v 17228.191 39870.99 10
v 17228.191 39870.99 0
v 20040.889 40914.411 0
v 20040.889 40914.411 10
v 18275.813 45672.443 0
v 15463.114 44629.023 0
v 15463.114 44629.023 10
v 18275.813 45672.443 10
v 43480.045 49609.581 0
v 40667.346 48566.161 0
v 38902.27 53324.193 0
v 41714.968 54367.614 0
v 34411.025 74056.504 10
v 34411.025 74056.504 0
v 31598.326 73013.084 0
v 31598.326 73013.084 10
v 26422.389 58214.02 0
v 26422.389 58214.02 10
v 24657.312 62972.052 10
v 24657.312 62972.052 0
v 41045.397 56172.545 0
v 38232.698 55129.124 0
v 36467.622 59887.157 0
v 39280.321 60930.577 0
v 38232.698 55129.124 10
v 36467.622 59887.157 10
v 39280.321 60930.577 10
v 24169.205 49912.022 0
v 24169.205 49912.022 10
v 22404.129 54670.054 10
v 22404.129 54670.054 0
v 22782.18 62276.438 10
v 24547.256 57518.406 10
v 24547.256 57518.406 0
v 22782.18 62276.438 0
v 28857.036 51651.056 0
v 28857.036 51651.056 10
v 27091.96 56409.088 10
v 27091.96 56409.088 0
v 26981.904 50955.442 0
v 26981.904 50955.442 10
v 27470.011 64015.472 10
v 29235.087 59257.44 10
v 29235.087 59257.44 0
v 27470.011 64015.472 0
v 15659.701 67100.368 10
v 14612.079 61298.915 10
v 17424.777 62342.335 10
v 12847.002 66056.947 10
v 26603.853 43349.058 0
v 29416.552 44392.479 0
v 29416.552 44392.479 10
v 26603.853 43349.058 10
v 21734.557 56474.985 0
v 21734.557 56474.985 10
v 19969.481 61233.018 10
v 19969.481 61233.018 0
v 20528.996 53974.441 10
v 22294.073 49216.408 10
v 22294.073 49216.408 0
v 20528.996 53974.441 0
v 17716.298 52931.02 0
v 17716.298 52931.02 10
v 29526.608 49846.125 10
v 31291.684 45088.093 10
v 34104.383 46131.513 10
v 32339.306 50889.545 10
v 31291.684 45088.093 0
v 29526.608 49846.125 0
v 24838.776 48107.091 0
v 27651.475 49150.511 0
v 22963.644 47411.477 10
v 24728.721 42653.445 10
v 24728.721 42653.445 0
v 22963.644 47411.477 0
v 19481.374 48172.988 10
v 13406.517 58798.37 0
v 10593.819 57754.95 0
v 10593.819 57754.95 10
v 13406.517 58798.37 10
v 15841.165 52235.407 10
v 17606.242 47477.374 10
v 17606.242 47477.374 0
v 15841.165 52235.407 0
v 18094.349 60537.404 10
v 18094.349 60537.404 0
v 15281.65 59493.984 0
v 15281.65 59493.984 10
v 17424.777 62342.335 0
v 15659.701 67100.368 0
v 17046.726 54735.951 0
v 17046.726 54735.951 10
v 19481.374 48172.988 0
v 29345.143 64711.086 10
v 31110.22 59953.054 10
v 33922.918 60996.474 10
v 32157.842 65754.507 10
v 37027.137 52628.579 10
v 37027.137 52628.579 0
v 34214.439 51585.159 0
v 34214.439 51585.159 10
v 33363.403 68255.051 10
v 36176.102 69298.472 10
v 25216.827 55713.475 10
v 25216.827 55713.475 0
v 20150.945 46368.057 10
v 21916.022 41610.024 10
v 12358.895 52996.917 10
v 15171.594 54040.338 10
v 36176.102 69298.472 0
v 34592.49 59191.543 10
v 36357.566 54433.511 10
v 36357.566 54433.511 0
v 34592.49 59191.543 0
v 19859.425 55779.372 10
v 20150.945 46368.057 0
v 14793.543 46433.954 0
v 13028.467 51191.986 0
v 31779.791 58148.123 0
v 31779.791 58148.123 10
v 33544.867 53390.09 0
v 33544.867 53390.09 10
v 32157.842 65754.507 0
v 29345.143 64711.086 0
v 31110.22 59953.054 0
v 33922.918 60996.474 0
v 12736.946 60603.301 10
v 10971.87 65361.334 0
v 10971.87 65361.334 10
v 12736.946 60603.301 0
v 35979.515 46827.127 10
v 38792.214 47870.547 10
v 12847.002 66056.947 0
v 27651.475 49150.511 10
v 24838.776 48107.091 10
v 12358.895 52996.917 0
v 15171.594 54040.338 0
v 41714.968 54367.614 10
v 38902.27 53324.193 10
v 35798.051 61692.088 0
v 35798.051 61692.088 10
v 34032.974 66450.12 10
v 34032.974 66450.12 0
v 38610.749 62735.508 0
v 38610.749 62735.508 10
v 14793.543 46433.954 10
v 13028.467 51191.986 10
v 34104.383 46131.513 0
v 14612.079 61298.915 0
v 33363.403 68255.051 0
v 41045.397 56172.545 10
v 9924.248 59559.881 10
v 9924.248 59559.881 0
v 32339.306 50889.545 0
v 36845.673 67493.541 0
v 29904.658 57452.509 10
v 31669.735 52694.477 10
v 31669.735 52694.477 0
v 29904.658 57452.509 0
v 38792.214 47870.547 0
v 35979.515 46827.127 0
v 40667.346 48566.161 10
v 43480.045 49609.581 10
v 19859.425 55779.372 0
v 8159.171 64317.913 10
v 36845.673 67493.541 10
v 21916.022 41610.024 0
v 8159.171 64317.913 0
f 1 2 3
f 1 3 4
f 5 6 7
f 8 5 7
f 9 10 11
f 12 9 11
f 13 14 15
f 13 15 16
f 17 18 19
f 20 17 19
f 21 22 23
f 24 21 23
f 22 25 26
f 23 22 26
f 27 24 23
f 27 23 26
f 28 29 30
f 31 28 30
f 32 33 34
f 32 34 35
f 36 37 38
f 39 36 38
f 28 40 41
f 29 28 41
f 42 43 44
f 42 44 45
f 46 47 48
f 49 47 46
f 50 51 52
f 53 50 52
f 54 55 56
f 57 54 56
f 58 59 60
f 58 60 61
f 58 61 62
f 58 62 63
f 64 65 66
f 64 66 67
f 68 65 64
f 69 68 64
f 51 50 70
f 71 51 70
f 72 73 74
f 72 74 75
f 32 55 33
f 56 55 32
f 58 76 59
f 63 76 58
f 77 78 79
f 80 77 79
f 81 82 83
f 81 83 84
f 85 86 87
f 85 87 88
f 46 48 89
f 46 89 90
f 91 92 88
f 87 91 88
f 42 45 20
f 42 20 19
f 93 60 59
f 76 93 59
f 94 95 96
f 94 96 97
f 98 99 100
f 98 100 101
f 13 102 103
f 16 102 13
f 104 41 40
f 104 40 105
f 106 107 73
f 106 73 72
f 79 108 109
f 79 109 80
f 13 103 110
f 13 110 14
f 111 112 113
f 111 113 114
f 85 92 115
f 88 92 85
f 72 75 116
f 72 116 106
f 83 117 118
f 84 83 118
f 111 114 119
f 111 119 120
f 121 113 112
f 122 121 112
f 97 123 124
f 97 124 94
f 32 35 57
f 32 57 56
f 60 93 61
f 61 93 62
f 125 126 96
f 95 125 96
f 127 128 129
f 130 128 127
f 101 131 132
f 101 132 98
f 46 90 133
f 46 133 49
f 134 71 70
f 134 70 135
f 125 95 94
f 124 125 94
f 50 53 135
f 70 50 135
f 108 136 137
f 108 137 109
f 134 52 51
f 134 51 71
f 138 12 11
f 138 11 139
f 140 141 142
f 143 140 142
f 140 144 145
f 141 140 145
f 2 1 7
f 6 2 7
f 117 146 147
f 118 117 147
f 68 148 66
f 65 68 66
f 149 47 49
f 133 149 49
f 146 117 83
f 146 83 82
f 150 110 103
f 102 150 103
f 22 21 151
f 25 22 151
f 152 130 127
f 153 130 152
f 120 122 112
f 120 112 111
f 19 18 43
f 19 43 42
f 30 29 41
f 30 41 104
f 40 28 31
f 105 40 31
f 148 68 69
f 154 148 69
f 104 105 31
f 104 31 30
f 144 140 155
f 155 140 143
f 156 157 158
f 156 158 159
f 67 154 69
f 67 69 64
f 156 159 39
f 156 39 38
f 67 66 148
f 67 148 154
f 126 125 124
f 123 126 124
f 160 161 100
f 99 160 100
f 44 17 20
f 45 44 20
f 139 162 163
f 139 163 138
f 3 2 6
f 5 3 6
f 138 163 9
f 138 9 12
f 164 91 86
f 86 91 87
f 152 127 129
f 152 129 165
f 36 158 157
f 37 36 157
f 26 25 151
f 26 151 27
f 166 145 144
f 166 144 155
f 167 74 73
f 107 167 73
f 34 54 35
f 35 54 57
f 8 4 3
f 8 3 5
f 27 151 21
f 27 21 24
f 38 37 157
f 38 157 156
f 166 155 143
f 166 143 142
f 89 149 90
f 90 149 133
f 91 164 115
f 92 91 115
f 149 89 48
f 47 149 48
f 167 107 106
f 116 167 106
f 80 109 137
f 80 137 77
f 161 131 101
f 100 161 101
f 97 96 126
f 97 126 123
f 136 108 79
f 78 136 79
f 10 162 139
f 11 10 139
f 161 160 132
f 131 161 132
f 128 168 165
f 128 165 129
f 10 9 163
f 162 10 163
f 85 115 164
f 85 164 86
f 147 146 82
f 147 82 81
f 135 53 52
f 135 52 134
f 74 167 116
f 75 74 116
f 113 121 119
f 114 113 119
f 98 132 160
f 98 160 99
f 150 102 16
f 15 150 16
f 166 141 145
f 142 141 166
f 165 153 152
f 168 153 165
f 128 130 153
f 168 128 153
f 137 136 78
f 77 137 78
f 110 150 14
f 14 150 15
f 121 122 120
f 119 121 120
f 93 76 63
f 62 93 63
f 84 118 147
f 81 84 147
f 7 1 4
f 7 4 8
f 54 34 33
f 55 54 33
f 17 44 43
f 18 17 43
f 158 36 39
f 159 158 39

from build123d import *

# Parameters (mm, degrees)
BOSS_EXTRUDE1_DEPTH   = 10
LPATTERN1_START       = 35019.972121918
LPATTERN1_OUTLINE_W   = 5074.876048893
LPATTERN1_OUTLINE_H   = 10
LPATTERN1_DEPTH       = 3000
LPATTERN1_START_2     = 55019.972121918
LPATTERN1_2_OUTLINE_W = 5074.876048893
LPATTERN1_2_OUTLINE_H = 10
LPATTERN1_2_DEPTH     = 3000
LPATTERN1_START_3     = 30019.972121918
LPATTERN1_3_OUTLINE_W = 5074.876048893
LPATTERN1_3_OUTLINE_H = 10
LPATTERN1_3_DEPTH     = 2999.999999999
LPATTERN1_START_4     = 40019.972121918
LPATTERN1_4_OUTLINE_W = 5074.876048893
LPATTERN1_4_OUTLINE_H = 10
LPATTERN1_4_DEPTH     = 3000
LPATTERN1_START_5     = 45019.972121918
LPATTERN1_5_OUTLINE_W = 5074.876048893
LPATTERN1_5_OUTLINE_H = 10
LPATTERN1_5_DEPTH     = 3000
LPATTERN1_START_6     = 50019.972121918
LPATTERN1_6_OUTLINE_W = 5074.876048893
LPATTERN1_6_OUTLINE_H = 10
LPATTERN1_6_DEPTH     = 3000


# Read off the part's stored shape, not the designer's step: LPattern1
with BuildPart() as part:
    # Sketch1 → Boss-Extrude1 (new body)
    with BuildSketch(Plane.XY):
        Polygon((8159.170995645, 64317.913133173), (10971.869650874, 65361.333602048), (12736.946166348, 60603.301255988), (9924.247511118, 59559.880787113), align=None)
    extrude(amount=BOSS_EXTRUDE1_DEPTH)


with BuildPart() as body_2:
    # LPattern1 outline → LPattern1 (new body)
    with BuildSketch(Plane(origin=(0, 0, 0), x_dir=(-0.3478068229585231, 0.937566218409931, 0), z_dir=(0.9375662184099312, 0.34780682295852305, 0)).offset(LPATTERN1_START)):
        with Locations((33927.049225871, 5)):
            Rectangle(LPATTERN1_OUTLINE_W, LPATTERN1_OUTLINE_H)
        with Locations((40927.049225871, 5)):
            Rectangle(LPATTERN1_OUTLINE_W, LPATTERN1_OUTLINE_H)
        with Locations((47927.049225871, 5)):
            Rectangle(LPATTERN1_OUTLINE_W, LPATTERN1_OUTLINE_H)
        with Locations((54927.049225871, 5)):
            Rectangle(LPATTERN1_OUTLINE_W, LPATTERN1_OUTLINE_H)
    extrude(amount=LPATTERN1_DEPTH)


with BuildPart() as body_3:
    # LPattern1 2 outline → LPattern1 2 (new body)
    with BuildSketch(Plane(origin=(0, 0, 0), x_dir=(-0.3478068229585231, 0.937566218409931, 0), z_dir=(0.9375662184099312, 0.34780682295852305, 0)).offset(LPATTERN1_START_2)):
        with Locations((33927.049225871, 5)):
            Rectangle(LPATTERN1_2_OUTLINE_W, LPATTERN1_2_OUTLINE_H)
        with Locations((40927.049225871, 5)):
            Rectangle(LPATTERN1_2_OUTLINE_W, LPATTERN1_2_OUTLINE_H)
        with Locations((47927.049225871, 5)):
            Rectangle(LPATTERN1_2_OUTLINE_W, LPATTERN1_2_OUTLINE_H)
        with Locations((54927.049225871, 5)):
            Rectangle(LPATTERN1_2_OUTLINE_W, LPATTERN1_2_OUTLINE_H)
    extrude(amount=LPATTERN1_2_DEPTH)


with BuildPart() as body_4:
    # LPattern1 3 outline → LPattern1 3 (new body)
    with BuildSketch(Plane(origin=(0, 0, 0), x_dir=(-0.3478068229585231, 0.937566218409931, 0), z_dir=(0.9375662184099312, 0.34780682295852305, 0)).offset(LPATTERN1_START_3)):
        with Locations((33927.049225871, 5)):
            Rectangle(LPATTERN1_3_OUTLINE_W, LPATTERN1_3_OUTLINE_H)
        with Locations((40927.049225871, 5)):
            Rectangle(LPATTERN1_3_OUTLINE_W, LPATTERN1_3_OUTLINE_H)
        with Locations((47927.049225871, 5)):
            Rectangle(LPATTERN1_3_OUTLINE_W, LPATTERN1_3_OUTLINE_H)
    extrude(amount=LPATTERN1_3_DEPTH)


with BuildPart() as body_5:
    # LPattern1 4 outline → LPattern1 4 (new body)
    with BuildSketch(Plane(origin=(0, 0, 0), x_dir=(-0.3478068229585231, 0.937566218409931, 0), z_dir=(0.9375662184099312, 0.34780682295852305, 0)).offset(LPATTERN1_START_4)):
        with Locations((33927.049225871, 5)):
            Rectangle(LPATTERN1_4_OUTLINE_W, LPATTERN1_4_OUTLINE_H)
        with Locations((40927.049225871, 5)):
            Rectangle(LPATTERN1_4_OUTLINE_W, LPATTERN1_4_OUTLINE_H)
        with Locations((47927.049225871, 5)):
            Rectangle(LPATTERN1_4_OUTLINE_W, LPATTERN1_4_OUTLINE_H)
    extrude(amount=LPATTERN1_4_DEPTH)


with BuildPart() as body_6:
    # LPattern1 5 outline → LPattern1 5 (new body)
    with BuildSketch(Plane(origin=(0, 0, 0), x_dir=(-0.3478068229585231, 0.937566218409931, 0), z_dir=(0.9375662184099312, 0.34780682295852305, 0)).offset(LPATTERN1_START_5)):
        with Locations((33927.049225871, 5)):
            Rectangle(LPATTERN1_5_OUTLINE_W, LPATTERN1_5_OUTLINE_H)
        with Locations((40927.049225871, 5)):
            Rectangle(LPATTERN1_5_OUTLINE_W, LPATTERN1_5_OUTLINE_H)
        with Locations((47927.049225871, 5)):
            Rectangle(LPATTERN1_5_OUTLINE_W, LPATTERN1_5_OUTLINE_H)
    extrude(amount=LPATTERN1_5_DEPTH)


with BuildPart() as body_7:
    # LPattern1 6 outline → LPattern1 6 (new body)
    with BuildSketch(Plane(origin=(0, 0, 0), x_dir=(-0.3478068229585231, 0.937566218409931, 0), z_dir=(0.9375662184099312, 0.34780682295852305, 0)).offset(LPATTERN1_START_6)):
        with Locations((33927.049225871, 5)):
            Rectangle(LPATTERN1_6_OUTLINE_W, LPATTERN1_6_OUTLINE_H)
        with Locations((40927.049225871, 5)):
            Rectangle(LPATTERN1_6_OUTLINE_W, LPATTERN1_6_OUTLINE_H)
        with Locations((47927.049225871, 5)):
            Rectangle(LPATTERN1_6_OUTLINE_W, LPATTERN1_6_OUTLINE_H)
    extrude(amount=LPATTERN1_6_DEPTH)


solid = Compound([part.part, body_2.part, body_3.part, body_4.part, body_5.part, body_6.part, body_7.part])
